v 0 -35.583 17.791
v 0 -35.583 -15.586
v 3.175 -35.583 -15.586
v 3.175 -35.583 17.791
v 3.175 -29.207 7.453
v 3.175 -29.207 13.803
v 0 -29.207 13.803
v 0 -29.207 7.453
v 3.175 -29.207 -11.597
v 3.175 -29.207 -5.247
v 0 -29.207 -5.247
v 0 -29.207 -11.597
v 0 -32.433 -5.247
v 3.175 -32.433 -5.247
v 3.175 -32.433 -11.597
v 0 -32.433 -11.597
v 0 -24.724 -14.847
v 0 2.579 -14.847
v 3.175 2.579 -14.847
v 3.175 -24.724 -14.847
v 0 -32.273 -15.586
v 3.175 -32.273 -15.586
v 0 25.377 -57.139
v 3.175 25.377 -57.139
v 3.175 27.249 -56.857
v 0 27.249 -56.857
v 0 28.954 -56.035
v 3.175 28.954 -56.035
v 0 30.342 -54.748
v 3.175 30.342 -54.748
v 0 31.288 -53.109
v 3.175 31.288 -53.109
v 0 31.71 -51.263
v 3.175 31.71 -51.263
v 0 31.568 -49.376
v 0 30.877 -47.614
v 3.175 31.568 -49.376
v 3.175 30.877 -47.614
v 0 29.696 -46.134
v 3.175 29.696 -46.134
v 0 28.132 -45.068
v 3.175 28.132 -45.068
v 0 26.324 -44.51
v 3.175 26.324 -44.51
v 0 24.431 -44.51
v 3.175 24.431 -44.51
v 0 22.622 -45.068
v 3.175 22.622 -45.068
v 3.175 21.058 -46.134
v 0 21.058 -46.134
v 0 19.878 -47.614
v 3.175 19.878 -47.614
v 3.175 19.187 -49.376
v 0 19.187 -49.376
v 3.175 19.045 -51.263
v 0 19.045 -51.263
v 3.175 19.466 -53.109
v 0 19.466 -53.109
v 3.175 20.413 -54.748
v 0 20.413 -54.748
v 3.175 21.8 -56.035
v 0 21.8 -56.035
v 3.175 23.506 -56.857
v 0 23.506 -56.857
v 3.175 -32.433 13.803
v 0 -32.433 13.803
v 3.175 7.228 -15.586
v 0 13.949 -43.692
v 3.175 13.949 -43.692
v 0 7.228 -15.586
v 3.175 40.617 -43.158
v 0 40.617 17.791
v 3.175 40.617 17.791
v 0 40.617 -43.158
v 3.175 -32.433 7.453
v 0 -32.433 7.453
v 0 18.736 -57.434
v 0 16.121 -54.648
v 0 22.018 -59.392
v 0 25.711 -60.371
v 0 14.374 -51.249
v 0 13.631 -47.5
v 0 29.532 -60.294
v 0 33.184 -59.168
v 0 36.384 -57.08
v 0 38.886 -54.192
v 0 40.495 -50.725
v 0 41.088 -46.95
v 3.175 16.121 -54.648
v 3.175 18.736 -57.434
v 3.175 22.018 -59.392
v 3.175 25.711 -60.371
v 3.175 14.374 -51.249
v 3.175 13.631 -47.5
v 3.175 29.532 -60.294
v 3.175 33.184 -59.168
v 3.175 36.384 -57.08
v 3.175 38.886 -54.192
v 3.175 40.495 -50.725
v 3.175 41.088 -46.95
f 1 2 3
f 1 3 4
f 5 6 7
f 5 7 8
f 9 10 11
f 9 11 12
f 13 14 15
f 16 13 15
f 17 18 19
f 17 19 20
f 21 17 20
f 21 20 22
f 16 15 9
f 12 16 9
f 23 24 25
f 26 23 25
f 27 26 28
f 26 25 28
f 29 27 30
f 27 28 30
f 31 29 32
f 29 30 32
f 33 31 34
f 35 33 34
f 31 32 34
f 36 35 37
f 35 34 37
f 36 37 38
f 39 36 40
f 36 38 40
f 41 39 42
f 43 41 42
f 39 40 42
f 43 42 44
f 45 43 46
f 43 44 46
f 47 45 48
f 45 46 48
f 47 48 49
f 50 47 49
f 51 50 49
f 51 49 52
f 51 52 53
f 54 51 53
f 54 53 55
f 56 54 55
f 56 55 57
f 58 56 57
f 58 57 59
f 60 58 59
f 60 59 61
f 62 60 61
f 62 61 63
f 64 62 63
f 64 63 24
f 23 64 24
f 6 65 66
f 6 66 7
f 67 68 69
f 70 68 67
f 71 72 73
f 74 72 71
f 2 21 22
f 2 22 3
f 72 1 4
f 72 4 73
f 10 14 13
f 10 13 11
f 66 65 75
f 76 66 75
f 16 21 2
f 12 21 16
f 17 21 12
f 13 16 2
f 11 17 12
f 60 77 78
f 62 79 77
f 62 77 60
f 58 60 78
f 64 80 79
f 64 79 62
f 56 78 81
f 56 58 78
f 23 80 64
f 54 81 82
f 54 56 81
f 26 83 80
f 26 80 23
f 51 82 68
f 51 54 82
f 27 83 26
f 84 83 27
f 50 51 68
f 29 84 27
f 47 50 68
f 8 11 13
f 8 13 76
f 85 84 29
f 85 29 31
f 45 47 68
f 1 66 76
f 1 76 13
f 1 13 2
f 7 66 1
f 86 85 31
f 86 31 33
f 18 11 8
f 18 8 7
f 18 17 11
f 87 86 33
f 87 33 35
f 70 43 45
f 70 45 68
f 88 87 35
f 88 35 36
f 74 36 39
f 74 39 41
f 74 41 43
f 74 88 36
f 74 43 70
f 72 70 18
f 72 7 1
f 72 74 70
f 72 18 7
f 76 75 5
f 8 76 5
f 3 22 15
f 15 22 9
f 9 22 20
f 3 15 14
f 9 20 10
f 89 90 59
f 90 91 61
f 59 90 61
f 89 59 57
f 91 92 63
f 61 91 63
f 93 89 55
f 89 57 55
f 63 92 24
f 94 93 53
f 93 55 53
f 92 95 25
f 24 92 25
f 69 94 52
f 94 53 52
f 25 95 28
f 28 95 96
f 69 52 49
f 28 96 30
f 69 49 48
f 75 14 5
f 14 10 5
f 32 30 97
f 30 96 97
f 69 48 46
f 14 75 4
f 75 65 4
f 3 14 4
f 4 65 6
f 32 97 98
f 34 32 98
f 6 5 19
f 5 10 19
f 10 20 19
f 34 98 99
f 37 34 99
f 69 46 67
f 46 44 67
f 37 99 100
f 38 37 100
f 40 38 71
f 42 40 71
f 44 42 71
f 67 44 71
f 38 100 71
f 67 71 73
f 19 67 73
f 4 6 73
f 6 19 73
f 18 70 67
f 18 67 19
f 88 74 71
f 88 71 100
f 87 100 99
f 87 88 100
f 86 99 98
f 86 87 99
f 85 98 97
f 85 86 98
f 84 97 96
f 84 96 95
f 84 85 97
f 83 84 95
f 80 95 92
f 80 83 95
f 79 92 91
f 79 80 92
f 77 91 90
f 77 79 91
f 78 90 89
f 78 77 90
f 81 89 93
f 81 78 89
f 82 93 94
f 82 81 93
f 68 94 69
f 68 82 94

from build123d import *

# Parameters (mm, degrees)
BOSS_EXTRUDE1_DEPTH = 3.175
SKETCH3_R           = 6.35
CUT_EXTRUDE2_DEPTH  = 4.175
CUT_EXTRUDE4_DEPTH  = 4.175
SKETCH4_W           = 6.35
SKETCH4_H           = 3.2258
CUT_EXTRUDE3_DEPTH  = 4.175


with BuildPart() as part:
    # Sketch1 → Boss-Extrude1 (new body)
    with BuildSketch(Plane(origin=(0, 0, 0), x_dir=(0, 0, -1), z_dir=(1, 0, 0))):
        with BuildLine():
            Line((20.308664328, 40.617328656), (43.157786531, 40.617328656))
            ThreePointArc((43.157786531, 40.617328656), (60.466141811, 27.624512399), (43.692194932, 13.948725661))
            Line((43.692194932, 13.948725661), (15.586038544, 7.228441393))
            Line((15.586038544, 7.228441393), (15.586038544, -35.582671344))
            Line((15.586038544, -35.582671344), (-17.791335672, -35.582671344))
            Line((-17.791335672, -35.582671344), (-17.791335672, 40.617328656))
            Line((-17.791335672, 40.617328656), (20.308664328, 40.617328656))
        make_face()
    extrude(amount=BOSS_EXTRUDE1_DEPTH)

    # Sketch3 → Cut-Extrude2 (cut, through all)
    with BuildSketch(Plane(origin=(3.175, 0, 0), x_dir=(0, 0, -1), z_dir=(1, 0, 0))):
        with Locations((50.788664328, 25.377328656)):
            Circle(SKETCH3_R)
    extrude(amount=-CUT_EXTRUDE2_DEPTH, mode=Mode.SUBTRACT)

    # Sketch5 → Cut-Extrude4 (cut, through all)
    with BuildSketch(Plane.ZY):
        Polygon((-15.586038544, 7.228441393), (-14.846971332, 2.578544694), (-14.846971332, -24.724280649), (-15.586038544, -32.273448946), align=None)
    extrude(amount=-CUT_EXTRUDE4_DEPTH, mode=Mode.SUBTRACT)

    # Sketch4 → Cut-Extrude3 (cut, through all)
    with BuildSketch(Plane(origin=(3.175, 0, 0), x_dir=(0, 0, -1), z_dir=(1, 0, 0))):
        with Locations((-10.627648564, -30.820171344)):
            Rectangle(SKETCH4_W, SKETCH4_H)
        with Locations((8.422351436, -30.820171344)):
            Rectangle(SKETCH4_W, SKETCH4_H)
    extrude(amount=-CUT_EXTRUDE3_DEPTH, mode=Mode.SUBTRACT)


solid = part.part
